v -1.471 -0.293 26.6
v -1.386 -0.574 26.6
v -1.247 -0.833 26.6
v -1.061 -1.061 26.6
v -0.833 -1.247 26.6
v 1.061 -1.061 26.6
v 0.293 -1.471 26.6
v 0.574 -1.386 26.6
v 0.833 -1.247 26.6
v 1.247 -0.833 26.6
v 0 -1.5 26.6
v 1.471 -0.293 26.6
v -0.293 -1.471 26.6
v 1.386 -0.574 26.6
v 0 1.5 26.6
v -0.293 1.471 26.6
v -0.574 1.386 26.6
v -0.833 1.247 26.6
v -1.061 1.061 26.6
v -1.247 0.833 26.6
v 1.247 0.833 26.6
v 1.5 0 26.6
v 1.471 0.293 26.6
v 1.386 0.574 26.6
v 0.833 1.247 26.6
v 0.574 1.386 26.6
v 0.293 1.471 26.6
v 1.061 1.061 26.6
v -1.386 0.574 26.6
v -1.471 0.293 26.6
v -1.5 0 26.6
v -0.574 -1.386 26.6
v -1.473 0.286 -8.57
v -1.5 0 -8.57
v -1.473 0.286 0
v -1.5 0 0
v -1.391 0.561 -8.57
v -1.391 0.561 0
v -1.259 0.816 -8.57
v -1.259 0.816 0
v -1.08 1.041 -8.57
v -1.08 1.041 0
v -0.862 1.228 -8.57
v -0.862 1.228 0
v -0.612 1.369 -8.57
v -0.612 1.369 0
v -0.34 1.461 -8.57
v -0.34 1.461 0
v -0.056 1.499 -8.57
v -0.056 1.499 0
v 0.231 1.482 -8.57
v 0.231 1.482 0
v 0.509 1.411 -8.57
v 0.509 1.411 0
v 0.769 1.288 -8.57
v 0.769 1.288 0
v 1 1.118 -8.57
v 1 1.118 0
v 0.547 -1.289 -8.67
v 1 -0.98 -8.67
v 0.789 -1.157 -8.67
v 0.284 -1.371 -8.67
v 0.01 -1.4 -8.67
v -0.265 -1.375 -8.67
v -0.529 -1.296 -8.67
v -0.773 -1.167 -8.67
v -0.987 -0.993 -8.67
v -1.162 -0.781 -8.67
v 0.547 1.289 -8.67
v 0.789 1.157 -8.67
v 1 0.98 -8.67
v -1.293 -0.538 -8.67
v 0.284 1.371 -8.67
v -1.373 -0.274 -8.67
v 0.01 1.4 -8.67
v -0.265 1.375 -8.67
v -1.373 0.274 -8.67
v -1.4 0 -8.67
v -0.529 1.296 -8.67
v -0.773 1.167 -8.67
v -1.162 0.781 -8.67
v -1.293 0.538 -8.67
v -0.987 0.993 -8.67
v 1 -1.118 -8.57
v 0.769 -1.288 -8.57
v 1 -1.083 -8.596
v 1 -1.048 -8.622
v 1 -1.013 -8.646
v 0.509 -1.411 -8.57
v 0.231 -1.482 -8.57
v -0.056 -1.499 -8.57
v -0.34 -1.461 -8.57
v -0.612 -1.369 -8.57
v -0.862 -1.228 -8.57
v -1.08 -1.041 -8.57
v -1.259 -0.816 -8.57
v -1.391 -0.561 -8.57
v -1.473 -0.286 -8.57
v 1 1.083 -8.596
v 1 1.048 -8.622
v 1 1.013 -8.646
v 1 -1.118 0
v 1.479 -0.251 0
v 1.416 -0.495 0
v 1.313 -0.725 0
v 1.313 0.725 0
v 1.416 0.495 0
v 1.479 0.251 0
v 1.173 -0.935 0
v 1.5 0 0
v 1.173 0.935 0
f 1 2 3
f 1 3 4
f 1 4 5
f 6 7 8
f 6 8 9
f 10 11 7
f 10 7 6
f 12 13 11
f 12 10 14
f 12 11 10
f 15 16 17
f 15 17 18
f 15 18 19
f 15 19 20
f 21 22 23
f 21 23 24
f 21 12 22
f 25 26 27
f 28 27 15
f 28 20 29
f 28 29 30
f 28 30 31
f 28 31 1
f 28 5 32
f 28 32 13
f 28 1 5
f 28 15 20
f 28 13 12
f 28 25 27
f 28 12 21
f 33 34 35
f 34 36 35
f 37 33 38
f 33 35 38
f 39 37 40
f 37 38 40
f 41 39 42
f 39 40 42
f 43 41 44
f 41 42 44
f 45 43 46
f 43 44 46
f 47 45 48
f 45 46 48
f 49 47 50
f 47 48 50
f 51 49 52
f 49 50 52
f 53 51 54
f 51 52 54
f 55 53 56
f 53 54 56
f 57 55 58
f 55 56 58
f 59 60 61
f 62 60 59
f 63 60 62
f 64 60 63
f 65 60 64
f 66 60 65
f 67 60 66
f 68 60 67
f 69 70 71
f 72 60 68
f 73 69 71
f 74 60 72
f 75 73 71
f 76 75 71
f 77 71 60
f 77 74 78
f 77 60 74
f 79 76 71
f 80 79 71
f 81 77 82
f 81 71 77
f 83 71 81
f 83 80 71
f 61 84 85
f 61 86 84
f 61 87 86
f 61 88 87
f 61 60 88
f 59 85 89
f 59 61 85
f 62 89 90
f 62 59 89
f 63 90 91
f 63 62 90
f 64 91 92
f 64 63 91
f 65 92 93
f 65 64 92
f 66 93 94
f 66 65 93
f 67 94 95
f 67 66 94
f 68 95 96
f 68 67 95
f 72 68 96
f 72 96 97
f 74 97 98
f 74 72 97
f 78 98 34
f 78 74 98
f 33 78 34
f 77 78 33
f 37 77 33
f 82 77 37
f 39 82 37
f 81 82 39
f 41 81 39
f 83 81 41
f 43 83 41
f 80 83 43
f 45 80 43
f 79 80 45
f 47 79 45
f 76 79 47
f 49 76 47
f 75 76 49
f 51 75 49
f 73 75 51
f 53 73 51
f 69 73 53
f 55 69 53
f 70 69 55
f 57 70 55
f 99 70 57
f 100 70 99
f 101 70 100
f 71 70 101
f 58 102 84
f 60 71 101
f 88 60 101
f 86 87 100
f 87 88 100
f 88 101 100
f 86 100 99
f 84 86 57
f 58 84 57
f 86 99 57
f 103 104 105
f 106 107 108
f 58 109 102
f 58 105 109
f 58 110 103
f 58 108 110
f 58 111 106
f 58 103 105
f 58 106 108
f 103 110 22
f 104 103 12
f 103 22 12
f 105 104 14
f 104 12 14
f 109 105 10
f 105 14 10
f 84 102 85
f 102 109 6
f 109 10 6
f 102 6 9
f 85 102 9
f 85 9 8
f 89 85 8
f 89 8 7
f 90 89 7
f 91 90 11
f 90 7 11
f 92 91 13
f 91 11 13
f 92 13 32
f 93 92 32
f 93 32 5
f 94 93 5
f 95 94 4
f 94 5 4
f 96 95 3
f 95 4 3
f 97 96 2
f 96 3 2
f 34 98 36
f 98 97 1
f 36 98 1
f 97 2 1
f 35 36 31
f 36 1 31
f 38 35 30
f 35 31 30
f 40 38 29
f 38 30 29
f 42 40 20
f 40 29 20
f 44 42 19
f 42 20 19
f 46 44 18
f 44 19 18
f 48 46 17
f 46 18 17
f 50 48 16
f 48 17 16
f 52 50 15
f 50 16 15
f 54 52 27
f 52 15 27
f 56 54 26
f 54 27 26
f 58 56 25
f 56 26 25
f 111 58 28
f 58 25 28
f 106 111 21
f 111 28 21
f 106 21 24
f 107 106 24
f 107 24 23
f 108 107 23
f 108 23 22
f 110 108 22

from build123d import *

# Parameters (mm, degrees)
SKETCH_1_R           = 1.5
EXTRUDE_1_DEPTH      = 26.6
SKETCH_2_R           = 1.5
EXTRUDE_2_DEPTH      = 8.67
CHAMFER_1_SIZE       = 0.1
SKETCH_3_OUTSIDE_W   = 12.104
SKETCH_3_OUTSIDE_H   = 12.104
SKETCH_3_OUTSIDE_W_2 = 2.5
SKETCH_3_OUTSIDE_H_2 = 3
CUT_EXTRUDE_1_DEPTH  = 8.67


with BuildPart() as part:
    # Эскиз1 → Бобышка-Вытянуть1 (new body)
    with BuildSketch(Plane.XY):
        Circle(SKETCH_1_R)
    extrude(amount=EXTRUDE_1_DEPTH)

    # Эскиз2 → Бобышка-Вытянуть2 (add)
    with BuildSketch(Plane(origin=(0, 0, 0), x_dir=(-1, 0, 0), z_dir=(0, 0, -1))):
        Circle(SKETCH_2_R)
    extrude(amount=EXTRUDE_2_DEPTH)

    # Фаска1
    chamfer_1_edges = [part.edges().sort_by_distance(p)[0] for p in [
        (1.5, 0, -8.67),
    ]]
    chamfer(chamfer_1_edges, length=CHAMFER_1_SIZE)

    # Эскиз3 outside → Вырез-Вытянуть1 (cut)
    with BuildSketch(Plane(origin=(0, 0, -8.67), x_dir=(-1, 0, 0), z_dir=(0, 0, -1))):
        Rectangle(SKETCH_3_OUTSIDE_W, SKETCH_3_OUTSIDE_H)
        with Locations((0.25, 0)):
            Rectangle(SKETCH_3_OUTSIDE_W_2, SKETCH_3_OUTSIDE_H_2, mode=Mode.SUBTRACT)
    extrude(amount=-CUT_EXTRUDE_1_DEPTH, mode=Mode.SUBTRACT)


solid = part.part
